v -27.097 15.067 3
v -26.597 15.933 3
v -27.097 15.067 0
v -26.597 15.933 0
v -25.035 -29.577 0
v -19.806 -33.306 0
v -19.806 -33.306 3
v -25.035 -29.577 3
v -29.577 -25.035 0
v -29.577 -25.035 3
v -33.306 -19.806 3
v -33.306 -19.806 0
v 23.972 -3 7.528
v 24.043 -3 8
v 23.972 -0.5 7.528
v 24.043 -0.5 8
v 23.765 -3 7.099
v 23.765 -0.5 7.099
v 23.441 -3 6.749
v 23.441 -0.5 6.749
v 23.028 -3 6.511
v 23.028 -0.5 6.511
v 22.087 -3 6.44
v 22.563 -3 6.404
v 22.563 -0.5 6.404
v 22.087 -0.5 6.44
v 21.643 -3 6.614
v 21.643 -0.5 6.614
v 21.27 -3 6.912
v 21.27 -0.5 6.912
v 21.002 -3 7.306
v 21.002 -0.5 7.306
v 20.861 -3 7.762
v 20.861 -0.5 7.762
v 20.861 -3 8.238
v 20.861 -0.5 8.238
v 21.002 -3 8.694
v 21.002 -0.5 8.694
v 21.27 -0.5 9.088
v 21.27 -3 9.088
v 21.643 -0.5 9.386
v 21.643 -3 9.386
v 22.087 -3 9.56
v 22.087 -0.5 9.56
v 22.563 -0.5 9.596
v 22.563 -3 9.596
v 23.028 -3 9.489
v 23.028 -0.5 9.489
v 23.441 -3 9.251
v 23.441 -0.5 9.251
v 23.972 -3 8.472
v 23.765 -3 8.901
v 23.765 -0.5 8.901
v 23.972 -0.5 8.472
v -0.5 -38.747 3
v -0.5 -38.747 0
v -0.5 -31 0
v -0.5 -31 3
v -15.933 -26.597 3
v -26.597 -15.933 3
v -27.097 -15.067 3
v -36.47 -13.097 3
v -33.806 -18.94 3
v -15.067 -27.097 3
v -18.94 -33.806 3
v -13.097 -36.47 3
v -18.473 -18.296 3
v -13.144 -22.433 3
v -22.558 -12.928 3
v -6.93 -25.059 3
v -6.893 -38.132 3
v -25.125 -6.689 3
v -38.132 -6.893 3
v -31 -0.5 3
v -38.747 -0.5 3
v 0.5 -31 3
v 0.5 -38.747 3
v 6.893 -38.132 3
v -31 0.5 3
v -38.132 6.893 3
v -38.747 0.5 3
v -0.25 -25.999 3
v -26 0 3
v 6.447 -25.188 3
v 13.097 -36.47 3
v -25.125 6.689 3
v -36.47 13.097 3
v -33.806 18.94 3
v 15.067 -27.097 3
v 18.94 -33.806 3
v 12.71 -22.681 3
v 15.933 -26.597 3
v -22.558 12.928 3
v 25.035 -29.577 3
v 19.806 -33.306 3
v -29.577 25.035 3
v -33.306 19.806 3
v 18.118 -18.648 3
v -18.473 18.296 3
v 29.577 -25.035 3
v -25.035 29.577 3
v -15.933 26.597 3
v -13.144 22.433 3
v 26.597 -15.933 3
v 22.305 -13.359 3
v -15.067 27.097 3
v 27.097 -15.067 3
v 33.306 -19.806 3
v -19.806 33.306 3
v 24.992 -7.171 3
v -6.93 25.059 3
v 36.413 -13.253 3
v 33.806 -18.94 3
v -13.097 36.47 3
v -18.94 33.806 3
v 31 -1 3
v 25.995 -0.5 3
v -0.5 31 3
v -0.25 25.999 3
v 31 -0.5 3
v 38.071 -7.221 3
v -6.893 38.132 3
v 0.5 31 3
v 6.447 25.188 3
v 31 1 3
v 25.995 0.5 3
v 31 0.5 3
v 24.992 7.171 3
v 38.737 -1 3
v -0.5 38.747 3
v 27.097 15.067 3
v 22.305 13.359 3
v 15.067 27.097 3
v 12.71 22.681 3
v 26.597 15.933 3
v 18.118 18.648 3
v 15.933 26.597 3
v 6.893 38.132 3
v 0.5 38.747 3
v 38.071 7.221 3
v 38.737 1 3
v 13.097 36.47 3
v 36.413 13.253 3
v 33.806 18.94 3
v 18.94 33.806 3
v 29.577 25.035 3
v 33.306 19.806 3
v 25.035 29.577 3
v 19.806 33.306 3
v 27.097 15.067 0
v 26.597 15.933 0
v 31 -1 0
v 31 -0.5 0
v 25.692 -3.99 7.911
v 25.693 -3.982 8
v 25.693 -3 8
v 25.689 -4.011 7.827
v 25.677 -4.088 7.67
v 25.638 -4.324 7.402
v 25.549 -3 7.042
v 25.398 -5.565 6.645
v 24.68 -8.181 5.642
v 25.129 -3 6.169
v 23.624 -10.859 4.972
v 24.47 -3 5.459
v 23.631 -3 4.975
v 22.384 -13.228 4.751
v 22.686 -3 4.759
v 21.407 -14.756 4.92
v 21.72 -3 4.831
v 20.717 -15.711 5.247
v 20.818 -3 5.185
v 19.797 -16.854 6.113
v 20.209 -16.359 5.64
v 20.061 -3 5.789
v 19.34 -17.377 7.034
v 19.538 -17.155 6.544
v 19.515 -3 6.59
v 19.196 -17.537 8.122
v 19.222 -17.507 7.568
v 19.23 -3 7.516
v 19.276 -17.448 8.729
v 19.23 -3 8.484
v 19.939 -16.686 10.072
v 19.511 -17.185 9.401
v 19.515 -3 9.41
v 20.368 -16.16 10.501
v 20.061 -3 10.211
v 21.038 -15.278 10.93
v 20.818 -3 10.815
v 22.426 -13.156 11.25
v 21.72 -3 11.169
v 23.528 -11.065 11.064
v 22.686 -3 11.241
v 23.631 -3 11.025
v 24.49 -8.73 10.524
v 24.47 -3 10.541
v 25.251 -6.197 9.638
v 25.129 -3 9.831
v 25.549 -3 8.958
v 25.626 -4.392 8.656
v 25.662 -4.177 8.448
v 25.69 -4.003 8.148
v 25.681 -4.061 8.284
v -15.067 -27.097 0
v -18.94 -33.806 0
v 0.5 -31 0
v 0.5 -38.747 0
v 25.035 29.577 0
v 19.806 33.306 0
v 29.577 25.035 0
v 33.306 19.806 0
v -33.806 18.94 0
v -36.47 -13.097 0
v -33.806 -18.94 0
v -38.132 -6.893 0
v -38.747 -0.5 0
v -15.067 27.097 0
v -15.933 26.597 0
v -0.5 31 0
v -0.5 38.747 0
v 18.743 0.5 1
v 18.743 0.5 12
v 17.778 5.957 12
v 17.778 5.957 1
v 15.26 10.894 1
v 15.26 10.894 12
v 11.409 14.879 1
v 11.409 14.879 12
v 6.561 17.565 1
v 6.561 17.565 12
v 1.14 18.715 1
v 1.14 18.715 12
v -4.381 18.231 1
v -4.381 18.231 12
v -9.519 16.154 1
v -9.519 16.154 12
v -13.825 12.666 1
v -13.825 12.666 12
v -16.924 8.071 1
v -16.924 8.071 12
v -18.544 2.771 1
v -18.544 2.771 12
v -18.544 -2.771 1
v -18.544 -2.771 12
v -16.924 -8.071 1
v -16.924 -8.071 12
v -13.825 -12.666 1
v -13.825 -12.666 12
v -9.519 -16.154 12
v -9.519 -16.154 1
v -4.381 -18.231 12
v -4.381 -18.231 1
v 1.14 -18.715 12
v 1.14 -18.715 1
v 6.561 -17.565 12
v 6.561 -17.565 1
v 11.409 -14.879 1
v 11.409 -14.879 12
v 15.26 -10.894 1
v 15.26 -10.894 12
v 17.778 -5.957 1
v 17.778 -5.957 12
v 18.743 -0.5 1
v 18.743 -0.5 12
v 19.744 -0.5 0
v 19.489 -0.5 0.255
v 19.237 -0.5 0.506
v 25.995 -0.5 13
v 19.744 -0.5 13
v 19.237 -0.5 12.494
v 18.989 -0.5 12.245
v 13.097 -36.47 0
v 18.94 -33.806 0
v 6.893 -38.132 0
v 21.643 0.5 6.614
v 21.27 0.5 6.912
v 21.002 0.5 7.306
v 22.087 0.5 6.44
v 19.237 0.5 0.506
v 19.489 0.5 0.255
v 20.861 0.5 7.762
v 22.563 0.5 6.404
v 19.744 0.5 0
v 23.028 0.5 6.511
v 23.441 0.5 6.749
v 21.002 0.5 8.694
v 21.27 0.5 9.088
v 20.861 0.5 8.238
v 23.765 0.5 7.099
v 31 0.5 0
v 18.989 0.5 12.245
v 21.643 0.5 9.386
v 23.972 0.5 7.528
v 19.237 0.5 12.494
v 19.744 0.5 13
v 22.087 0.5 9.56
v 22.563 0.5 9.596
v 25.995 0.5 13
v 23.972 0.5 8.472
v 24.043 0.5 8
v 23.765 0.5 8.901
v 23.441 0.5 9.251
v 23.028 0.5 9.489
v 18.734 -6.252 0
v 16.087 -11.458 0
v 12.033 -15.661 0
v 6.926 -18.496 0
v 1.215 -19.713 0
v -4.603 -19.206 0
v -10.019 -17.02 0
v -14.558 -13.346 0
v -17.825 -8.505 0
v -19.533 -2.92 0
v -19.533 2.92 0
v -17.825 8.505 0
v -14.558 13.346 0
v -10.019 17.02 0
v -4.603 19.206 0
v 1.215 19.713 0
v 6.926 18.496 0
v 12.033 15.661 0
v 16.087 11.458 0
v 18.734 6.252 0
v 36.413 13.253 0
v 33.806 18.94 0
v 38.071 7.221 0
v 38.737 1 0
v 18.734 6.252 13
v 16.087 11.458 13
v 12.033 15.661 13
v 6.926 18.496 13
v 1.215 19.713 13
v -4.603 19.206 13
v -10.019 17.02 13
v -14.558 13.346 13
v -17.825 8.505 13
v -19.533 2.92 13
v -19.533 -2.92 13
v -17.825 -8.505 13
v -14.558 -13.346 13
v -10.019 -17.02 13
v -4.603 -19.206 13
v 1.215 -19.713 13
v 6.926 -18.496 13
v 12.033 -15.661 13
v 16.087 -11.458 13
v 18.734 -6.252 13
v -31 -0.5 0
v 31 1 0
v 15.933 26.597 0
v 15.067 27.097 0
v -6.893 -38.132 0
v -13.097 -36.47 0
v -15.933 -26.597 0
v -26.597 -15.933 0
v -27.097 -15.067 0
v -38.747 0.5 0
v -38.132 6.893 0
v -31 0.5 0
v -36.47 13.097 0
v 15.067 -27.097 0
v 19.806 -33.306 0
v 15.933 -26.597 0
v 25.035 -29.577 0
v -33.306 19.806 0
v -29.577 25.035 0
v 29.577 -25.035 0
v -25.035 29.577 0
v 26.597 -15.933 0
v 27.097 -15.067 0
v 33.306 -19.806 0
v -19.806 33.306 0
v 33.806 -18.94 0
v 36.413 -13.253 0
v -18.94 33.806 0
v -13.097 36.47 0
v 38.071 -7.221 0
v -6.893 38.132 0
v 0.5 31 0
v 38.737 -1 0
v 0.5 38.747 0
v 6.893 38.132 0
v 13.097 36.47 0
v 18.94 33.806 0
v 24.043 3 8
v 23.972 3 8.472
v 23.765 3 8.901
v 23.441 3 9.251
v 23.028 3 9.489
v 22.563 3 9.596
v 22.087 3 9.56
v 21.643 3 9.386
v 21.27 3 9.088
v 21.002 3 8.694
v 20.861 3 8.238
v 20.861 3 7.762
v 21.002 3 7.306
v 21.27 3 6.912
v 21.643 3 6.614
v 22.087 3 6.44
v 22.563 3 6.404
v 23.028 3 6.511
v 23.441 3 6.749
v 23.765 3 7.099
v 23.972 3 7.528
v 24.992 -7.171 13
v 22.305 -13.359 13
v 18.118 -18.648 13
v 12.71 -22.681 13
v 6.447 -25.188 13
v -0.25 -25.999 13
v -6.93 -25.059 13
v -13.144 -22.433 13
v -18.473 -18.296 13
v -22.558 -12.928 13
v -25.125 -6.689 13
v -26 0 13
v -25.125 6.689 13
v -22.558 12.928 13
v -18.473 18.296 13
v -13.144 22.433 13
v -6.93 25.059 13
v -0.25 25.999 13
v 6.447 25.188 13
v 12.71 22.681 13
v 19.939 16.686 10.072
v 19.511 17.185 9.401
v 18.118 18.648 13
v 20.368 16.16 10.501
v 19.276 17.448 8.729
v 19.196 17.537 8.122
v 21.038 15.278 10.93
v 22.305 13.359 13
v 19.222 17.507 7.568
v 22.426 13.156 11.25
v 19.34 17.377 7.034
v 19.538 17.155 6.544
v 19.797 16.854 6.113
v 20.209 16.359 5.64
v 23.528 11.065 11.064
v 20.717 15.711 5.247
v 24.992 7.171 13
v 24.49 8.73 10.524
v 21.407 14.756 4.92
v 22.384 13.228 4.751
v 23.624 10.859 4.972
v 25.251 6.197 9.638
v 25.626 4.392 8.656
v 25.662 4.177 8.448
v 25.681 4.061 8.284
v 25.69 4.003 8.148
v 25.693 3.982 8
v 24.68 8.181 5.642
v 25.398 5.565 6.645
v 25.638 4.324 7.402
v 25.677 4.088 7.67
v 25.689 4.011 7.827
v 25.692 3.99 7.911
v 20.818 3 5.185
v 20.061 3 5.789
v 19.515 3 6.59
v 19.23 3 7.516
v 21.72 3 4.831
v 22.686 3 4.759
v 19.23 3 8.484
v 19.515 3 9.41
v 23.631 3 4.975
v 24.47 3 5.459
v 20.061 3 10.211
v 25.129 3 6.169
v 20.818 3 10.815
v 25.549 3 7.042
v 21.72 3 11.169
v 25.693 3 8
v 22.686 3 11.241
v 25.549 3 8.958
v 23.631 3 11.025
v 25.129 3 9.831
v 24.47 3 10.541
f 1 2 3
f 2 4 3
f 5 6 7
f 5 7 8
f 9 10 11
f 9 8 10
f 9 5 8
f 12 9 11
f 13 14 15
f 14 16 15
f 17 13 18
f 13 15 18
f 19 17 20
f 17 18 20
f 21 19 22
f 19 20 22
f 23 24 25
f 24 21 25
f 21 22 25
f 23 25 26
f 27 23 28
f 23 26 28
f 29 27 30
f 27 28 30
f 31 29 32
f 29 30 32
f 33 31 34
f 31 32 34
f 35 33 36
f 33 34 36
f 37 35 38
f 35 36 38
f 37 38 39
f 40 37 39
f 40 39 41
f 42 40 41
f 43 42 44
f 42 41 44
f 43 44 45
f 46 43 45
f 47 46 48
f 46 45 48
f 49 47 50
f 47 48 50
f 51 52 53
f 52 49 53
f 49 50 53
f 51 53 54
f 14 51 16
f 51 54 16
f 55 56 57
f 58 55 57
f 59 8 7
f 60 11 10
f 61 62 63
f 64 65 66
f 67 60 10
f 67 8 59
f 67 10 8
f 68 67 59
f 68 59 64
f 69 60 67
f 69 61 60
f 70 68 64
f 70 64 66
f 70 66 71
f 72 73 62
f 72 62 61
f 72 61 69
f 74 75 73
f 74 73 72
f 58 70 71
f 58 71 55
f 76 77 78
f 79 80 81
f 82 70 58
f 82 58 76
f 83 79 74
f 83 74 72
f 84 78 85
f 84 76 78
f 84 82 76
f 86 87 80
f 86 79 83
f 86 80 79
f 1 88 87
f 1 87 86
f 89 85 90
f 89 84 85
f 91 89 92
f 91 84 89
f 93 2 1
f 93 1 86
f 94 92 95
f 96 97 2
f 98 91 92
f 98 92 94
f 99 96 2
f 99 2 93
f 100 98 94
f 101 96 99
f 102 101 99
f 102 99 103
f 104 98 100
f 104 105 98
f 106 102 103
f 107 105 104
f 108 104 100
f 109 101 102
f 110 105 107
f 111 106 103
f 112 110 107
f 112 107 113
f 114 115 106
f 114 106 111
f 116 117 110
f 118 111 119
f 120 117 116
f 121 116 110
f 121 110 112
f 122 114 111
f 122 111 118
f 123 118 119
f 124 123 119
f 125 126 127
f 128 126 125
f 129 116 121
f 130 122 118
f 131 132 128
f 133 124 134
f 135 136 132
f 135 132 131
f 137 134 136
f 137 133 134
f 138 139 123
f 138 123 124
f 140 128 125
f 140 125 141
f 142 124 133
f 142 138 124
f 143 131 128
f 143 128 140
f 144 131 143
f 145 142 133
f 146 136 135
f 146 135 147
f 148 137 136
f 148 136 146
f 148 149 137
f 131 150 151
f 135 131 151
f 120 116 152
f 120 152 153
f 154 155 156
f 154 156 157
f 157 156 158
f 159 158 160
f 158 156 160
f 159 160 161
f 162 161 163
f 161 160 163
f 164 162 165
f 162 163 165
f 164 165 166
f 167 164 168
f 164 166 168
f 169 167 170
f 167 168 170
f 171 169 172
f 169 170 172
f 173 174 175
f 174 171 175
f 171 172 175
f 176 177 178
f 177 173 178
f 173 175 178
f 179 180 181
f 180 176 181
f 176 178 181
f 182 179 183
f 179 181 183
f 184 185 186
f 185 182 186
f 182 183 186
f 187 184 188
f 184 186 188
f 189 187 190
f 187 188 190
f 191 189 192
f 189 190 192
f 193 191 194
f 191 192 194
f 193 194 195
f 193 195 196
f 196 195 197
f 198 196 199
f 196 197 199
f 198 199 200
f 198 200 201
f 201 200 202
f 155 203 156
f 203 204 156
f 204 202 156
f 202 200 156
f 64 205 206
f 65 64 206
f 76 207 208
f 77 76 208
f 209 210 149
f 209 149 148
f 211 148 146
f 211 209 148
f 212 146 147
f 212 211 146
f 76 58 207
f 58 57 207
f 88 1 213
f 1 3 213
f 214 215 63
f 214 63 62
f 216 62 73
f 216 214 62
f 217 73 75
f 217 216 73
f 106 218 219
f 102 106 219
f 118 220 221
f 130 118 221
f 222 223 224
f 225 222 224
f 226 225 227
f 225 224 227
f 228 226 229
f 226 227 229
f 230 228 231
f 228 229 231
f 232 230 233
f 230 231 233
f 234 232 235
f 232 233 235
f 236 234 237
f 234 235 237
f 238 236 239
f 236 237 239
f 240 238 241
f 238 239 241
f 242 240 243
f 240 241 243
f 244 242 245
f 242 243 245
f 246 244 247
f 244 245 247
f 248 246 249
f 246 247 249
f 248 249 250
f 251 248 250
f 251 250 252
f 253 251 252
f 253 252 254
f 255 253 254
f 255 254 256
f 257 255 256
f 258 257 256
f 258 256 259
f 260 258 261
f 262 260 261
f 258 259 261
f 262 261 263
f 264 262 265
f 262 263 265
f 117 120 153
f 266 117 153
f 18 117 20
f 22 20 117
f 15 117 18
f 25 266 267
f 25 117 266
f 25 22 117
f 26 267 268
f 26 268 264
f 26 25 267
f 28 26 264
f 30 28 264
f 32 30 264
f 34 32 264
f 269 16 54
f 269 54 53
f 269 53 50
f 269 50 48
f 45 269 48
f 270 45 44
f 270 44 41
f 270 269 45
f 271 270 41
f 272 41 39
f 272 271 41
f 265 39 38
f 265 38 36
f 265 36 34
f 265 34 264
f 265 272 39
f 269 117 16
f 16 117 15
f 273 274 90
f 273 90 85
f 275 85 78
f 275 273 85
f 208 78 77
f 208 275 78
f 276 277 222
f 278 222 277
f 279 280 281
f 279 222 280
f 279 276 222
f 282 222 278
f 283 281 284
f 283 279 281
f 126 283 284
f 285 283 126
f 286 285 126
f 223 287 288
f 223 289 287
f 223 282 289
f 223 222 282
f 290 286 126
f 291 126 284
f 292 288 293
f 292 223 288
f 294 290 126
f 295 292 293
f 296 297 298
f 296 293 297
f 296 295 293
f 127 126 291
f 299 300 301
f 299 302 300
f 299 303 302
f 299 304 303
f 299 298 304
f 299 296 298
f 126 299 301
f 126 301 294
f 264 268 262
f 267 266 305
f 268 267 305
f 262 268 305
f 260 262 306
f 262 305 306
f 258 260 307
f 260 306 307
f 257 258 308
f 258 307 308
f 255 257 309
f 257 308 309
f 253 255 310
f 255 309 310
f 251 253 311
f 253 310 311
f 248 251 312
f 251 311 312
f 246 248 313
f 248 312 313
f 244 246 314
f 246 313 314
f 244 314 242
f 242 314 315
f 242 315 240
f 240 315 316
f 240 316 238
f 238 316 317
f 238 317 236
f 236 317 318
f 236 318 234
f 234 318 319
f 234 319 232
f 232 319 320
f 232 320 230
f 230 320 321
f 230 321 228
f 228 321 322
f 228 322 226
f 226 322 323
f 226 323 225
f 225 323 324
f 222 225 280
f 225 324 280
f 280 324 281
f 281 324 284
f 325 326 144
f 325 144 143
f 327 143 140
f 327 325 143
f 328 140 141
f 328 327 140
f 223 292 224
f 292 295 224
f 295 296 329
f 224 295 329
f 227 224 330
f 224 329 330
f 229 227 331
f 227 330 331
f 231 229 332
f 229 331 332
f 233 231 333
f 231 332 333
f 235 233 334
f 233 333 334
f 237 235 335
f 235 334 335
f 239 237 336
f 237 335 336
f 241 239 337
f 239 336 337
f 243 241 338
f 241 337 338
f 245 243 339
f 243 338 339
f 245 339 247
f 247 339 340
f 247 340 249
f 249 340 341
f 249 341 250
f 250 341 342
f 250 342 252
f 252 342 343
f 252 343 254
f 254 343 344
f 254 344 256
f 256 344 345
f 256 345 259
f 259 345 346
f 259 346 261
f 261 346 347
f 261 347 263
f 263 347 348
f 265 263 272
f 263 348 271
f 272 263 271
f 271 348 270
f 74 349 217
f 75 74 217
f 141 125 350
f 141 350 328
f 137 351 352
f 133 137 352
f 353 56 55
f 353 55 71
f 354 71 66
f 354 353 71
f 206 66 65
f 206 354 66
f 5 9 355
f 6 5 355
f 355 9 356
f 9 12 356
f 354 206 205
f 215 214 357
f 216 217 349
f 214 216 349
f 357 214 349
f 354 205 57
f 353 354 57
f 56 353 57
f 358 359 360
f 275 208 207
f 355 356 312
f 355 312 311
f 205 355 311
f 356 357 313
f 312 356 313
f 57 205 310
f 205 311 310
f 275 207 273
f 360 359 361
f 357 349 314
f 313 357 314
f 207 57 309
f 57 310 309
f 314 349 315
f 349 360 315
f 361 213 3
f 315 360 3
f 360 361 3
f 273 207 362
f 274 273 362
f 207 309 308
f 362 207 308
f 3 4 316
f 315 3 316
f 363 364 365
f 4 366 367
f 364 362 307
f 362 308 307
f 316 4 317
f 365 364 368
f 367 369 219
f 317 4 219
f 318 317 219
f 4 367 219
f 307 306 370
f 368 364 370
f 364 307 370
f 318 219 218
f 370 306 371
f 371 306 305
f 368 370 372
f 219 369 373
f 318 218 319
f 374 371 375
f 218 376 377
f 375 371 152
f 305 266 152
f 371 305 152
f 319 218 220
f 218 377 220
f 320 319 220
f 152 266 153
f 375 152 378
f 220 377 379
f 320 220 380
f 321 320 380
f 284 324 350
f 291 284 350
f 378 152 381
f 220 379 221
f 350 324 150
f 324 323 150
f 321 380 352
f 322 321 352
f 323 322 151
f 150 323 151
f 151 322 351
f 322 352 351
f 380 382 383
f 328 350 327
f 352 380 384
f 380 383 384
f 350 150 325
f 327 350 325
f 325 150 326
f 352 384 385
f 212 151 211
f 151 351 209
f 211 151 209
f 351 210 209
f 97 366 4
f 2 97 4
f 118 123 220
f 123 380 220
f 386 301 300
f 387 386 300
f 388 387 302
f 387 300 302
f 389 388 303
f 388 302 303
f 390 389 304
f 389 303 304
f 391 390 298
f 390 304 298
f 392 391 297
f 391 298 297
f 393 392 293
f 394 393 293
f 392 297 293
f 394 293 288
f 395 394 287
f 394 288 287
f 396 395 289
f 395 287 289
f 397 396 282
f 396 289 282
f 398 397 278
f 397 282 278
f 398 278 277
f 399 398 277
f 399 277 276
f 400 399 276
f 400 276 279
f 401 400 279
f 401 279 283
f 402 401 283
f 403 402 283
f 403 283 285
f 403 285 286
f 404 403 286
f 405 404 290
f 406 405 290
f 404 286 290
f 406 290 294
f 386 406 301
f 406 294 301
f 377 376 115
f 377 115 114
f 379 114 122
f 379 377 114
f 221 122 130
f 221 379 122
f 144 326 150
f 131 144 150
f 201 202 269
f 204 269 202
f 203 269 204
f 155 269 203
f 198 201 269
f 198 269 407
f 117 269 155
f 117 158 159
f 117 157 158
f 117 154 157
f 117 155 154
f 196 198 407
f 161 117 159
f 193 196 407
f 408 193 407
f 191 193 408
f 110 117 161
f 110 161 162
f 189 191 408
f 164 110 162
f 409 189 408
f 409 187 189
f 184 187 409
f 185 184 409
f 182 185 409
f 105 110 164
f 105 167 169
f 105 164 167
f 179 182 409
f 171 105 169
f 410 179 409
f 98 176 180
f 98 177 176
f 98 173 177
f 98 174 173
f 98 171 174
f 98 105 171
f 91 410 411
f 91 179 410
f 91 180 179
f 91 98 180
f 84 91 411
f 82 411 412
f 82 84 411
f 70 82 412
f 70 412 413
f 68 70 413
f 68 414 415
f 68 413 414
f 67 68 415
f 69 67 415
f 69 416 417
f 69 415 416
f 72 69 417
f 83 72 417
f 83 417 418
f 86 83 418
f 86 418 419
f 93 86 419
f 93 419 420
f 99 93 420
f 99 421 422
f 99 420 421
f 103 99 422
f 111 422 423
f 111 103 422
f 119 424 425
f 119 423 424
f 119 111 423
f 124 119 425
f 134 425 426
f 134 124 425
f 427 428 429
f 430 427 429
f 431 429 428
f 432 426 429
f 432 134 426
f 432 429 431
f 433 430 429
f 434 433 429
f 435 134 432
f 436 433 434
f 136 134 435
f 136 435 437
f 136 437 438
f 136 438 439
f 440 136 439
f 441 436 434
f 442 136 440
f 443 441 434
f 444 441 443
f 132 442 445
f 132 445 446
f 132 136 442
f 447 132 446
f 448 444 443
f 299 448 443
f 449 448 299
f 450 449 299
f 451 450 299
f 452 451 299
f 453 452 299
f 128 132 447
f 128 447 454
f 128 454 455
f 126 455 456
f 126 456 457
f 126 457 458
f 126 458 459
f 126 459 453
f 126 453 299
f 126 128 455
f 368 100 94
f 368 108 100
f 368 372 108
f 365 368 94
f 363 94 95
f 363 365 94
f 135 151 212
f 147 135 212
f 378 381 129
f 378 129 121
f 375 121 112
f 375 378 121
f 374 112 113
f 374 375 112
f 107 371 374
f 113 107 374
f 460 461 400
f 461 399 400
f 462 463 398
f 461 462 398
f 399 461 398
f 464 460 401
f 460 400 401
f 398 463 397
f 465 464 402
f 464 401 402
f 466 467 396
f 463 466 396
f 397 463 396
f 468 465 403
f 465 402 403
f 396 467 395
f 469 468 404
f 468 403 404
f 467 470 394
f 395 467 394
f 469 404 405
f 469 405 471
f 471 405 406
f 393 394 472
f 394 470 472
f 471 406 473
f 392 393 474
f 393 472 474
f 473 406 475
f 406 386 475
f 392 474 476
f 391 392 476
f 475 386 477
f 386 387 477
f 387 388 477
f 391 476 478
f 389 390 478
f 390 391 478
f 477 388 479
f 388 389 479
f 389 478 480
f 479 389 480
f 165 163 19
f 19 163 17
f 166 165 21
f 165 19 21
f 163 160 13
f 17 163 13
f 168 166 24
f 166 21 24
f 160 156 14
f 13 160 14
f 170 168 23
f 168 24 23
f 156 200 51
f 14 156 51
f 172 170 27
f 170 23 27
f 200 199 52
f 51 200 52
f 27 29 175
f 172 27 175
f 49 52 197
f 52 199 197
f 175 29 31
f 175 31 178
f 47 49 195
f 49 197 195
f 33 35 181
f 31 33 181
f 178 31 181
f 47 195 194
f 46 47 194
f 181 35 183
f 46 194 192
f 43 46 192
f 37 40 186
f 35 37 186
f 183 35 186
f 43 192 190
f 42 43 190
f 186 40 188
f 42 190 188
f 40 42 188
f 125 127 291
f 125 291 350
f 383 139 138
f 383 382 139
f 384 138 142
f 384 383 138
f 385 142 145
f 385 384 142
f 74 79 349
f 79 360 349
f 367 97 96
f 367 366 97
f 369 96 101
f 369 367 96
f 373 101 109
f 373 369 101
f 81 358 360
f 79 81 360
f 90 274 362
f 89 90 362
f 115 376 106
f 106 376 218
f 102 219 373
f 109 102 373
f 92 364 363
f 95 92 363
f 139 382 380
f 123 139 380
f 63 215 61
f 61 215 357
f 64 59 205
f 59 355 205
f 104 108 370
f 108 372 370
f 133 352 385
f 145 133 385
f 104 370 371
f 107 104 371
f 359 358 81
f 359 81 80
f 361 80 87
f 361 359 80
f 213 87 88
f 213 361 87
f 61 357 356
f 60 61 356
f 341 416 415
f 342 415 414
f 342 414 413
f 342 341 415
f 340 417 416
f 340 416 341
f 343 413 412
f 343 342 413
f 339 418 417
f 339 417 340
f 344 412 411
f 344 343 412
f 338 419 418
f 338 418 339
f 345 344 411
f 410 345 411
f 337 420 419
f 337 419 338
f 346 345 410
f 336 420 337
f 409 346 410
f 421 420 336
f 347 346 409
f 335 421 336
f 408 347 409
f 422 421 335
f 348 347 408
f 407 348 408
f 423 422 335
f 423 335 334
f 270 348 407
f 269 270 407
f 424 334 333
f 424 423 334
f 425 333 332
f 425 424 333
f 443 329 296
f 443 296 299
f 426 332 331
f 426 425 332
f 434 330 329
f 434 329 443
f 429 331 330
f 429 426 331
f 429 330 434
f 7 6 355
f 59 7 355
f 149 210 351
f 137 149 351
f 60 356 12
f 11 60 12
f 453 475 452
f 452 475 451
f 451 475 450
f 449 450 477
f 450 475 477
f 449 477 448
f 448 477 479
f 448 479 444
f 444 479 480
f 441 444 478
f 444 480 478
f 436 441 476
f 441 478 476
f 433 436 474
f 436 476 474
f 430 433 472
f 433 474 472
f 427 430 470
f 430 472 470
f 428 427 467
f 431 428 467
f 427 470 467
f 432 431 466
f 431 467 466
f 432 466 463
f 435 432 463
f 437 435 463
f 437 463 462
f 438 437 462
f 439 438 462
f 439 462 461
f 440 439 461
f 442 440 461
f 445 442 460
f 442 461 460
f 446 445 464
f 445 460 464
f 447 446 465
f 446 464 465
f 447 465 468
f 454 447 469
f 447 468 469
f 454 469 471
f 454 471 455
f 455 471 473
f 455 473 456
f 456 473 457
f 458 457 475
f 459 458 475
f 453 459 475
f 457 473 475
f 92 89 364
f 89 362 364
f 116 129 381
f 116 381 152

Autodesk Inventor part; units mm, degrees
ref_plane "YZ Plane" through (0, 0, 0) normal (1, 0, 0) x (0, 1, 0)
ref_plane "XZ Plane" through (0, 0, 0) normal (0, 1, 0) x (-1, 0, 0)
sketch "Sketch1" plane through (0, 0, 0) normal (0, 0, 1) x (1, 0, 0)
  circle A0 centre (0, 0) radius 38.75
  line L0 (-0.5, 39) -> (0.5, 39)
  line L1 (0.5, 39) -> (0.5, 31)
  line L2 (0.5, 31) -> (-0.5, 31)
  line L3 (-0.5, 31) -> (-0.5, 39)
  line L4 (-15.933, 26.5968) -> (-19.933, 33.525)
  line L5 (-19.067, 34.025) -> (-15.067, 27.0968)
  line L6 (-15.067, 27.0968) -> (-15.933, 26.5968)
  line L7 (-19.933, 33.525) -> (-19.067, 34.025)
  line L8 (-27.0968, 15.067) -> (-34.025, 19.067)
  line L9 (-33.525, 19.933) -> (-26.5968, 15.933)
  line L10 (-26.5968, 15.933) -> (-27.0968, 15.067)
  line L11 (-34.025, 19.067) -> (-33.525, 19.933)
  line L12 (-31, -0.5) -> (-39, -0.5)
  line L13 (-39, 0.5) -> (-31, 0.5)
  line L14 (-31, 0.5) -> (-31, -0.5)
  line L15 (-39, -0.5) -> (-39, 0.5)
  line L16 (-26.5968, -15.933) -> (-33.525, -19.933)
  line L17 (-34.025, -19.067) -> (-27.0968, -15.067)
  line L18 (-27.0968, -15.067) -> (-26.5968, -15.933)
  line L19 (-33.525, -19.933) -> (-34.025, -19.067)
  line L20 (-15.067, -27.0968) -> (-19.067, -34.025)
  line L21 (-19.933, -33.525) -> (-15.933, -26.5968)
  line L22 (-15.933, -26.5968) -> (-15.067, -27.0968)
  line L23 (-19.067, -34.025) -> (-19.933, -33.525)
  line L24 (0.5, -31) -> (0.5, -39)
  line L25 (-0.5, -39) -> (-0.5, -31)
  line L26 (-0.5, -31) -> (0.5, -31)
  line L27 (0.5, -39) -> (-0.5, -39)
  line L28 (15.933, -26.5968) -> (19.933, -33.525)
  line L29 (19.067, -34.025) -> (15.067, -27.0968)
  line L30 (15.067, -27.0968) -> (15.933, -26.5968)
  line L31 (19.933, -33.525) -> (19.067, -34.025)
  line L32 (27.0968, -15.067) -> (34.025, -19.067)
  line L33 (33.525, -19.933) -> (26.5968, -15.933)
  line L34 (26.5968, -15.933) -> (27.0968, -15.067)
  line L35 (34.025, -19.067) -> (33.525, -19.933)
  line L36 (31, 0.5) -> (39, 0.5)
  line L37 (39, -0.5) -> (31, -0.5)
  line L38 (31, -0.5) -> (31, 0.5)
  line L39 (39, 0.5) -> (39, -0.5)
  line L40 (26.5968, 15.933) -> (33.525, 19.933)
  line L41 (34.025, 19.067) -> (27.0968, 15.067)
  line L42 (27.0968, 15.067) -> (26.5968, 15.933)
  line L43 (33.525, 19.933) -> (34.025, 19.067)
  line L44 (15.067, 27.0968) -> (19.067, 34.025)
  line L45 (19.933, 33.525) -> (15.933, 26.5968)
  line L46 (15.933, 26.5968) -> (15.067, 27.0968)
  line L47 (19.067, 34.025) -> (19.933, 33.525)
  point P0 (0, 31)
  point P1 (-0.5, 38.7468)
  point P2 (0.5, 38.7468)
  point P3 (-15.5, 26.8468)
  point P4 (-26.8468, 15.5)
  point P5 (-31, 0)
  point P6 (-26.8468, -15.5)
  point P7 (-15.5, -26.8468)
  point P8 (0, -31)
  point P9 (15.5, -26.8468)
  point P10 (26.8468, -15.5)
  point P11 (31, 0)
  point P12 (26.8468, 15.5)
  point P13 (15.5, 26.8468)
  point P14 (-18.9404, 33.8057)
  point P15 (-19.8064, 33.3057)
  point P16 (-33.3057, 19.8064)
  point P17 (-33.8057, 18.9404)
  point P18 (-38.7468, 0.5)
  point P19 (-38.7468, -0.5)
  point P20 (-33.8057, -18.9404)
  point P21 (-33.3057, -19.8064)
  point P22 (-19.8064, -33.3057)
  point P23 (-18.9404, -33.8057)
  point P24 (-0.5, -38.7468)
  point P25 (0.5, -38.7468)
  point P26 (18.9404, -33.8057)
  point P27 (19.8064, -33.3057)
  point P28 (33.3057, -19.8064)
  point P29 (33.8057, -18.9404)
  point P30 (38.7468, -0.5)
  point P31 (38.7468, 0.5)
  point P32 (33.8057, 18.9404)
  point P33 (33.3057, 19.8064)
  point P34 (19.8064, 33.3057)
  point P35 (18.9404, 33.8057)
  dimension "d0" = 77.5
  dimension "d1" = 1
  dimension "d2" = 8
  dimension "d3" = 0.5
  dimension "d4" = 31
  dimension "d9" = 360
extrude "Extrusion1" add sketch "Sketch1" along normal blind 3 contours L36 L38 L37 A0 L32 L34 L33 L28 L30 L29 L24 L26 L25 L20 L22 L21 L16 L18 L17 L12 L14 L13 L8 L10 L9 L4 L6 L5 L3 L2 L1 L44 L46 L45 L40 L42 L41
sketch "Sketch2" plane through (0, 0, 3) normal (0, 0, 1) x (1, 0, 0)
  circle A0 centre (0, 0) radius 18.75
  circle A1 centre (0, 0) radius 26
  dimension "d11" = 37.5
  dimension "d12" = 52
extrude "Extrusion2" add sketch "Sketch2" along normal blind 10
sketch "Sketch3" plane through (0, 0, 3) normal (0, 0, 1) x (1, 0, 0)
  circle A0 centre (0, 0) radius 18.75
extrude "Extrusion3" cut sketch "Sketch3" against normal blind 10
sketch "Sketch4" plane through (0, 0, 13) normal (0, 0, 1) x (1, 0, 0)
  arc A0 (33.8057, -18.9404) -> (38.7468, -0.5) centre (0, 0) ccw projected
  line L0 (38.7468, -0.5) -> (17.4484, -0.5)
  line L1 (17.4484, -0.5) -> (17.4484, 0.5)
  line L2 (17.4484, 0.5) -> (38.7468, 0.5)
  line L3 (38.7468, 0.5) -> (38.7468, -0.5)
  line L4 (31, 1) -> (40.0251, 1)
  line L5 (40.0251, 1) -> (40.0251, -1)
  line L6 (40.0251, -1) -> (31, -1)
  line L7 (31, -1) -> (31, 1)
  point P0 (31, -0.5)
  point P1 (31, 0.5)
  dimension "d19" = 2
  dimension "d20" = 0.5
extrude "Extrusion4" cut sketch "Sketch4" against normal through all
sketch "Sketch5" plane through (18.7433, 0.5, 13) normal (0, -1, 0) x (1, 0, 0)
  circle A0 centre (3.7, -5) radius 1.6
  line L0 (14.5624, -10) -> (1.0631, -10) projected
  line L1 (-37.4933, 0) -> (0, 0) projected
  line L2 (0, 0) -> (0, -10)
  point P0 (-18.7433, -13)
  point P1 (0, -5)
  dimension "d21" = 3.2
  dimension "d22" = 5
  dimension "d23" = 3.7
extrude "Extrusion5" cut sketch "Sketch5" against normal blind 23.5
ref_plane "Work Plane1" through (18.7433, 3, 13) normal (0, -1, 0) x (1, 0, 0)
sketch "Sketch6" plane through (18.7433, 3, 13) normal (0, -1, 0) x (1, 0, 0)
  circle A0 centre (3.7, -5) radius 1.6 projected
  circle A1 centre (3.7, -5) radius 3.25
  point P0 (-18.7433, -13)
  dimension "d27" = 6.5
extrude "Extrusion6" cut sketch "Sketch6" against normal blind 23.5
mirror "Mirror1" about plane through (0, 0, 0) normal (0, 1, 0) of "Extrusion6", "Extrusion5"
chamfer "Chamfer1" distance 1 angle 45 2 edges at (-18.75, 0, 13) (-18.75, 0, 0)
properties part number "disk_12_slot"
